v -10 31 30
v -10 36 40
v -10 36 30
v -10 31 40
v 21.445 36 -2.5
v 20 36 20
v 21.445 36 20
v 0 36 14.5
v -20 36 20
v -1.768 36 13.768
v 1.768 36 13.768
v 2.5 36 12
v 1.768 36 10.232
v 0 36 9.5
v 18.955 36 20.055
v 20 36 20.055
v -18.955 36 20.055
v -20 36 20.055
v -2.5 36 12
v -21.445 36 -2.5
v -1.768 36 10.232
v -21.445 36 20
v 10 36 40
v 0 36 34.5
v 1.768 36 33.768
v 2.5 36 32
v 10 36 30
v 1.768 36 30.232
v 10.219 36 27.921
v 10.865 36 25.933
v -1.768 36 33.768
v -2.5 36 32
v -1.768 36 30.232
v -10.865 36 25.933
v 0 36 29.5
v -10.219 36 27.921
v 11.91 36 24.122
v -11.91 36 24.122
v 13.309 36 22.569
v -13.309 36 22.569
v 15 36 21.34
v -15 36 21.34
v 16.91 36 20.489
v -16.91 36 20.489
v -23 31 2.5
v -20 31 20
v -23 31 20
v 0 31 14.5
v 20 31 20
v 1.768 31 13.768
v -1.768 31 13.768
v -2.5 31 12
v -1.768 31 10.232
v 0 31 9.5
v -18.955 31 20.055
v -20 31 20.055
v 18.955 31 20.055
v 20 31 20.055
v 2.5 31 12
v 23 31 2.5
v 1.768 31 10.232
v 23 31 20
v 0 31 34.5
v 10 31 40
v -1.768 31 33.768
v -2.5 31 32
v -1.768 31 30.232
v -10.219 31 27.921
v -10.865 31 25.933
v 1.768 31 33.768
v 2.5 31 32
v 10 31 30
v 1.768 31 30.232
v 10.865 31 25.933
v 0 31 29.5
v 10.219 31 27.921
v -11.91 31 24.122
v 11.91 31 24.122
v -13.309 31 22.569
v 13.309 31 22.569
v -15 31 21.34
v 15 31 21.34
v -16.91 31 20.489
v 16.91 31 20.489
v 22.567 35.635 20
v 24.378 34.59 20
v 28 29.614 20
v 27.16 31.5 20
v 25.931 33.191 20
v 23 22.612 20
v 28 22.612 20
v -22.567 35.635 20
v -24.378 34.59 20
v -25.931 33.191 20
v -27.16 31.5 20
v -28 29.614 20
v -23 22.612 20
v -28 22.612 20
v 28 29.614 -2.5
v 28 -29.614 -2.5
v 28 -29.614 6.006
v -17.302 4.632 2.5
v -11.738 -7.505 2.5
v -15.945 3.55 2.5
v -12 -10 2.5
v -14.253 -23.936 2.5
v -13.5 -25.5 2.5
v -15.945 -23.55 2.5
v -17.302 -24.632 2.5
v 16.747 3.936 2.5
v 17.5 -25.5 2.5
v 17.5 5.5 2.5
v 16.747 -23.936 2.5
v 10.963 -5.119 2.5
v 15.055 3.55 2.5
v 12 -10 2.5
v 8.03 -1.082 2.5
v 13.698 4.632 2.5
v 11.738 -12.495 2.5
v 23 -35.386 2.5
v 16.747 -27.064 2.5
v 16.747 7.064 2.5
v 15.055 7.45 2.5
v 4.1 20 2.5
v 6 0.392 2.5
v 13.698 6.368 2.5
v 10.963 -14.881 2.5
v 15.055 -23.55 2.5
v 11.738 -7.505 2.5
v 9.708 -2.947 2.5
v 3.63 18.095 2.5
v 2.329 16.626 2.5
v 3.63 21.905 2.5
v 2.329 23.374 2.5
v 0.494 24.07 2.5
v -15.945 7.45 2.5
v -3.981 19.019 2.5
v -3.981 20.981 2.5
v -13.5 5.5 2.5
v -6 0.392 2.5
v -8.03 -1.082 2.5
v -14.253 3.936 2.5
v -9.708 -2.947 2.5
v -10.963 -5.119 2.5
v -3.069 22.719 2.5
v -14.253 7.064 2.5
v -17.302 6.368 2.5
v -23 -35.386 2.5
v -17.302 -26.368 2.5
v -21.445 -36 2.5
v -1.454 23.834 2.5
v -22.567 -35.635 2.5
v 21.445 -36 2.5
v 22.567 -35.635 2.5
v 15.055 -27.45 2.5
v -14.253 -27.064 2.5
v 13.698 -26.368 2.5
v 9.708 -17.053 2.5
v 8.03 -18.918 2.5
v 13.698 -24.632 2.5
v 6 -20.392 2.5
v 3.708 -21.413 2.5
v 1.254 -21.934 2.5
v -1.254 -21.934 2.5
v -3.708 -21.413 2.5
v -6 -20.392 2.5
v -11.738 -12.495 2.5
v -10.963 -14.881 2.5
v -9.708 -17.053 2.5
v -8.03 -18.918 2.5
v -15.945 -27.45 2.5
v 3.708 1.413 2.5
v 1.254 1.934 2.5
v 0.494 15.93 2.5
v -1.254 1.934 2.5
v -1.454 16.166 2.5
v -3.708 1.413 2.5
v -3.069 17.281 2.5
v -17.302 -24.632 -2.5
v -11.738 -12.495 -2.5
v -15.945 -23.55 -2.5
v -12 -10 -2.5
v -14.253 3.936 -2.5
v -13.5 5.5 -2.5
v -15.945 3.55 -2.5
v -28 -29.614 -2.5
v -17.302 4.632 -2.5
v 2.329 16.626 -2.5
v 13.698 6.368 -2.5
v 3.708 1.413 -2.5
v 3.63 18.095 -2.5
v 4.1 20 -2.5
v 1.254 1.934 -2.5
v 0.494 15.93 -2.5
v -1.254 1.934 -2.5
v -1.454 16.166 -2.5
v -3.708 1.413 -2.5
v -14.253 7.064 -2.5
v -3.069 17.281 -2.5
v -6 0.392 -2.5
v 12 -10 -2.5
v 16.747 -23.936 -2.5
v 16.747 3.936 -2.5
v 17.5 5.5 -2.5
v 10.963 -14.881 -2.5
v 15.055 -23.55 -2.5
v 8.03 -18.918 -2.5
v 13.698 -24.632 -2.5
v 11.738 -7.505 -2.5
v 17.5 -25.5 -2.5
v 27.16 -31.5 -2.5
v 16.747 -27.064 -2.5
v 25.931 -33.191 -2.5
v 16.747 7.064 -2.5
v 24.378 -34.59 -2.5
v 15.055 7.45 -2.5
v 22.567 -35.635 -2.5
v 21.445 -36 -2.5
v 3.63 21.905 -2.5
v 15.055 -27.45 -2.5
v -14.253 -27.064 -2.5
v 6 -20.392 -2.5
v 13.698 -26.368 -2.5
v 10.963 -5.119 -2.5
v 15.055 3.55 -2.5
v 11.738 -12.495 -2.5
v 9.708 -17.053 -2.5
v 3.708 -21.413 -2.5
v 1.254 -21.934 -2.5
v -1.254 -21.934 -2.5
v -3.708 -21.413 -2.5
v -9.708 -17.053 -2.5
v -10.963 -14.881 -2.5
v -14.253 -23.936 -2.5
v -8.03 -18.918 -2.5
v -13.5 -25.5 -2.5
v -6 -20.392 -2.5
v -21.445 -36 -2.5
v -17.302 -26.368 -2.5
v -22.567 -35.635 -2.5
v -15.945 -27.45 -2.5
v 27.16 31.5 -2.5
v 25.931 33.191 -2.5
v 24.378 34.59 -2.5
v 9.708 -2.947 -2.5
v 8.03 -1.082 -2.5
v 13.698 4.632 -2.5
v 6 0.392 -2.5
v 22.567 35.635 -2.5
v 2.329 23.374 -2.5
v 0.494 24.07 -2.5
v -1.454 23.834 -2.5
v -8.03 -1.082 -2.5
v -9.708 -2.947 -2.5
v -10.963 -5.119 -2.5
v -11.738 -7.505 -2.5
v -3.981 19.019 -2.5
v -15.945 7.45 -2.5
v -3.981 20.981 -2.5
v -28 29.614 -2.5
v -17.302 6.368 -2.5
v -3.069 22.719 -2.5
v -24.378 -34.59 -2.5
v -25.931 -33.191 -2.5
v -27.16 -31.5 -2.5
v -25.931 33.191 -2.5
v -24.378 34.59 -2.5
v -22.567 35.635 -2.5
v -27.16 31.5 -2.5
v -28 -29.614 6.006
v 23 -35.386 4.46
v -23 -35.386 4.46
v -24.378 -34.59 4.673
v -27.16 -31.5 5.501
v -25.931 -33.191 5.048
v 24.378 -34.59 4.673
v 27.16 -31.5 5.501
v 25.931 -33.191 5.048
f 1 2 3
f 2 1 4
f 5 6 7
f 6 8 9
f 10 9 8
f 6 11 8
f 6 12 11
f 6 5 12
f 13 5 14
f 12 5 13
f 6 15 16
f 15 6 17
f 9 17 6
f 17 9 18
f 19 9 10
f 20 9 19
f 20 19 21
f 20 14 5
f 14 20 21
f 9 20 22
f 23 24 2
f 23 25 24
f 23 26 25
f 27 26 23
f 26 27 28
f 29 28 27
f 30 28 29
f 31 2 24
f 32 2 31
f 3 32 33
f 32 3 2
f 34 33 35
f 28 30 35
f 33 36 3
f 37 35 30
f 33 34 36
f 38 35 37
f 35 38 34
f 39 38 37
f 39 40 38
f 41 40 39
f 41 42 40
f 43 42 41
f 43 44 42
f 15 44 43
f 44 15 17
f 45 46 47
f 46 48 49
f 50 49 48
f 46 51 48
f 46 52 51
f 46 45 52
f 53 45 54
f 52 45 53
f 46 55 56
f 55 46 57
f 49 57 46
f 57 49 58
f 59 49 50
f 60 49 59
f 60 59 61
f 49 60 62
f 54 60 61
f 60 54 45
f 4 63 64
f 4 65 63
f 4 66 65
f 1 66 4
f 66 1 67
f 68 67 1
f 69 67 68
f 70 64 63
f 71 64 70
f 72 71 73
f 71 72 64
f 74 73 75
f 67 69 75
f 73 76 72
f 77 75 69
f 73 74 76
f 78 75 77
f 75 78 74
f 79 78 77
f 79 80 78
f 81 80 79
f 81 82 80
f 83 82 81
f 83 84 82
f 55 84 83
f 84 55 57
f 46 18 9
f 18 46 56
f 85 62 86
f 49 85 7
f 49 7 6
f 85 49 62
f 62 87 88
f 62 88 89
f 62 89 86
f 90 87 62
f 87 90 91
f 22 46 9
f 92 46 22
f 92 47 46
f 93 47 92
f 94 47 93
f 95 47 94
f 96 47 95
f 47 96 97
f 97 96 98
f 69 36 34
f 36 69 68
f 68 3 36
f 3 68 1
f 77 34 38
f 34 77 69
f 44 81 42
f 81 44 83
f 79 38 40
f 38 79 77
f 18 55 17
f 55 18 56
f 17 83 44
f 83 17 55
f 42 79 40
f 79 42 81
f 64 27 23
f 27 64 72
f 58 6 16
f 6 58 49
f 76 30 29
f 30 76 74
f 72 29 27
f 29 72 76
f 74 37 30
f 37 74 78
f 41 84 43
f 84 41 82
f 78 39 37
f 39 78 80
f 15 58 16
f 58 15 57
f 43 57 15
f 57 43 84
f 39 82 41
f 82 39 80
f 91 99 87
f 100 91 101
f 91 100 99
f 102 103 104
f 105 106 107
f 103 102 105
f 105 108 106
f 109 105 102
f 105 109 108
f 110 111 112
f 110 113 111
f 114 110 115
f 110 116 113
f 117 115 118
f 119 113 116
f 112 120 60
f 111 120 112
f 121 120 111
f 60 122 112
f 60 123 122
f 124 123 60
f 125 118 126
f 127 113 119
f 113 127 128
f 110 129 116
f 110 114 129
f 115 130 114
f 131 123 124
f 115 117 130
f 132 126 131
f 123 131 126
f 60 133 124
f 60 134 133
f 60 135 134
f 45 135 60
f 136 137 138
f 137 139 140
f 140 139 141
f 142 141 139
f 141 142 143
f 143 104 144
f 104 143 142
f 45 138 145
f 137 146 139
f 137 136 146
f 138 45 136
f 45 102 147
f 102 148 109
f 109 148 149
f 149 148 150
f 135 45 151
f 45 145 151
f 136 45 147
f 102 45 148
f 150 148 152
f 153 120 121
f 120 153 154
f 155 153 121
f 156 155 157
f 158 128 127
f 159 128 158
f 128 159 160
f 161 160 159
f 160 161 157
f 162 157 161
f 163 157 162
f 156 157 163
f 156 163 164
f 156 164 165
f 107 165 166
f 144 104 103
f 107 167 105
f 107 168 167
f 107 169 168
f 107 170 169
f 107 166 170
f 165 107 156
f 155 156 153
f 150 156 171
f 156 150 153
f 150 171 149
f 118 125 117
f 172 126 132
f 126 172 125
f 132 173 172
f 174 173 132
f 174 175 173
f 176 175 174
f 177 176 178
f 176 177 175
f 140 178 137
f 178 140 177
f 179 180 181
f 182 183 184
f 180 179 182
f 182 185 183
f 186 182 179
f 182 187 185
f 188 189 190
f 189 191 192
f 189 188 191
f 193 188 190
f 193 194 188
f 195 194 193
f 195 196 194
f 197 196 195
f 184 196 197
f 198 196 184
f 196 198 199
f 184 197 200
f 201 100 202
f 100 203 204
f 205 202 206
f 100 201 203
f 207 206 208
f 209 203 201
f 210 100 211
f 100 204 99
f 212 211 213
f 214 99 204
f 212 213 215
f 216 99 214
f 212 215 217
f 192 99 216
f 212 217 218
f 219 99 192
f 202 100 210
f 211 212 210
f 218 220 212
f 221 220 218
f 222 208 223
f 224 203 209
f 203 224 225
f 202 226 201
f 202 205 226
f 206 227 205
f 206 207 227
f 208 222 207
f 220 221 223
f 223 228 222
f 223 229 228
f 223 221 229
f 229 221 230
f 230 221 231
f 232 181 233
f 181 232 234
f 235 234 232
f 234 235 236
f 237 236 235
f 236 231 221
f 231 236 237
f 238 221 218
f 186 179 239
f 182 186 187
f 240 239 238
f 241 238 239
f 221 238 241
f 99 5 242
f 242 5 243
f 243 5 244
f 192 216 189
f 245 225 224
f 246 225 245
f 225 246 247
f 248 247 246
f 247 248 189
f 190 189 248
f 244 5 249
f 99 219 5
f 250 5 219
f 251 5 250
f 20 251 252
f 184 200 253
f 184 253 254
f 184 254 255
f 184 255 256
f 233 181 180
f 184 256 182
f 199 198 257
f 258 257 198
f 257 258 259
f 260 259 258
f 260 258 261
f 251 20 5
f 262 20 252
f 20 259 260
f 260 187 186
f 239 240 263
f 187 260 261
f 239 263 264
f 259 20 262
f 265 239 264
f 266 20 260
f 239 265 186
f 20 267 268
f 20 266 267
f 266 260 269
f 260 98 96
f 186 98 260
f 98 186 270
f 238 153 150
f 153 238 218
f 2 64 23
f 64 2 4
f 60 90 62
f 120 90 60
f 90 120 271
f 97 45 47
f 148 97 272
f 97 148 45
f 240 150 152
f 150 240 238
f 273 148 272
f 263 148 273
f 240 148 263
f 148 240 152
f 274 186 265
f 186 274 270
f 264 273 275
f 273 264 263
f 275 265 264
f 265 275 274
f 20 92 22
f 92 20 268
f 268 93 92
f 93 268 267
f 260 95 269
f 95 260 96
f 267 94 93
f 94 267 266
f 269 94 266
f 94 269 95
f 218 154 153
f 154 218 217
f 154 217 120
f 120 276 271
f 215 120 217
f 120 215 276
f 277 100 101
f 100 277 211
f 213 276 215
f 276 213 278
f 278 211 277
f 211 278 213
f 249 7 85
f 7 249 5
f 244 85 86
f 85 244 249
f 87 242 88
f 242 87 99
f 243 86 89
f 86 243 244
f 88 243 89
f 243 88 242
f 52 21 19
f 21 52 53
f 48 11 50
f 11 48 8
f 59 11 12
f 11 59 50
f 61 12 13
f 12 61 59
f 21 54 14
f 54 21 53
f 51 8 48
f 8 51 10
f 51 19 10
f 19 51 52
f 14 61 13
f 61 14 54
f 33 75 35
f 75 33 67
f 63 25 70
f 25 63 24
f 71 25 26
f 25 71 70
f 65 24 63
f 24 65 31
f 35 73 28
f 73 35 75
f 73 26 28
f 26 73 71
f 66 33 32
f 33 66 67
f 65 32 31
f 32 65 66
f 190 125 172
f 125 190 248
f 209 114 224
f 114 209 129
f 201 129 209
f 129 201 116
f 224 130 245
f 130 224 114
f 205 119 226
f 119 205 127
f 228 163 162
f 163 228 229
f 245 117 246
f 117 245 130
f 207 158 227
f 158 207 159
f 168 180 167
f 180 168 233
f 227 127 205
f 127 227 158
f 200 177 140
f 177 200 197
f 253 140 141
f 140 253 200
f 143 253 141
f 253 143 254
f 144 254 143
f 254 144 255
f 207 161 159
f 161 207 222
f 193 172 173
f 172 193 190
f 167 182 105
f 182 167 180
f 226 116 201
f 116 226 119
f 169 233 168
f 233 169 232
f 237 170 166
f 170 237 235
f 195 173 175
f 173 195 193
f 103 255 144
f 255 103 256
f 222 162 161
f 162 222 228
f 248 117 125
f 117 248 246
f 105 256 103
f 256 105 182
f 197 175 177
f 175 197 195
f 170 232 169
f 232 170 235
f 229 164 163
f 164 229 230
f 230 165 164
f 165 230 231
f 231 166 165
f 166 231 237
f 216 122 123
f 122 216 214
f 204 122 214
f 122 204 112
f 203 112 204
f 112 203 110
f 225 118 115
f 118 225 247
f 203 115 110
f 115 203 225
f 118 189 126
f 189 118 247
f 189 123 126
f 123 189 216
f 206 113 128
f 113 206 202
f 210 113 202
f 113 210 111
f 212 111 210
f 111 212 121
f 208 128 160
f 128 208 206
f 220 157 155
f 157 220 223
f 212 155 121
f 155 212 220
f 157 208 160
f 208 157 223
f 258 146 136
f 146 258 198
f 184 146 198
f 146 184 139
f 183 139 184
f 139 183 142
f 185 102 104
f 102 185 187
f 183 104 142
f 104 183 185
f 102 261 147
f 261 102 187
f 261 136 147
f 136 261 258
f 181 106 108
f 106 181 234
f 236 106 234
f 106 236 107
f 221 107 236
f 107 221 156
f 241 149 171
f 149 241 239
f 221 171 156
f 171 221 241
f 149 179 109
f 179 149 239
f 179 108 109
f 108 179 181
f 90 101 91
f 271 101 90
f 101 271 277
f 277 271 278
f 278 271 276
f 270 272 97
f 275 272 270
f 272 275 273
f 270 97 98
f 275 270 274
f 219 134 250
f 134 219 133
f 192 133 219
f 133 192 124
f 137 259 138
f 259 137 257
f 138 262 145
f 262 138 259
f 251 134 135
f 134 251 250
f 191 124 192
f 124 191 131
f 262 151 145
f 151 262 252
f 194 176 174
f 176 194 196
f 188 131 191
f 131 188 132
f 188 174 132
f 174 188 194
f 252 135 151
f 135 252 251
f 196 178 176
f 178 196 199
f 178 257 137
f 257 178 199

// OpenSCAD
// file: Rook_Config.scad
// Rook 3D Printer Configuration
// Created By Jeffrey Olijar 
// Jolijar@gmail.com
// Revision 1.00


// 608 skate bearing
Bearing_OD = 22.5; 
Bearing_ID = 8;
Bearing_H = 7;

//M5 Screw Hole Diameter
M5 = 5;
//M4 Screw Hole Diameter
M4 = 4;

//M8 Rod Diameter (configure for a tight fit)
M8 = 8.2;
//M8 Nut Diameter
N8 = 15.5;

//LM8UU Bearing
LBD = 15.5; // Diameter
LBH = 25; // Height
LBI = 8;  // Inner Diameter

//Makergear Groovemount
GVO = 16.5; // Outside Diameter
GVI = 12.5;  // Inside Groove Diameter
// main file
// Rook 3D Printer 
// Z Motor Holder
// Created By Jeffrey Olijar 
// Jolijar@gmail.com
// Revision 1.00
// 2 x requred 

include <Rook_Config.scad>

module Rook_Z_Motor(){



//Fillets
	difference(){
		union(){
			rotate(a=[-90,0,0])translate(v=[-20,-30,31]){	
	difference(){
		cube(size = [10,10,5]);
		cylinder(r=10, h=25, center=true);
		}}
		rotate(a=[-90,0,180])translate(v=[-20,-30,-36]){	
	difference(){
			cube(size = [10,10,5]);
			cylinder(r=10, h=25, center=true);
			}}






			cube(size = [56,72,5], center = true);
			translate(v=[0,33.5,20]){			
				cube(size = [20,5,40], center = true);
				}
			translate(v=[0,33.5,10]){			
				cube(size = [56,5,20], center = true);
				}
			translate(v=[25.5,0,10]){			
				cube(size = [5,72,20], center = true);
				}
			translate(v=[-25.5,0,10]){			
				cube(size = [5,72,20], center = true);
				}
			}


		union(){


difference(){
		union(){
			rotate(a=[0,180,90])translate(v=[26.5,18.5,-10]){	
	difference(){
		cube(size = [10,10,25]);
		cylinder(r=10, h=25, center=true);
		}}}}
difference(){
		union(){
			rotate(a=[0,0,90])translate(v=[26.5,18.5,-5]){	
	difference(){
		cube(size = [10,10,25]);
		cylinder(r=10, h=55, center=true);
		}}}}

rotate(a=[0,180,0])translate(v=[0,0,0]){
difference(){
		union(){
			rotate(a=[0,180,90])translate(v=[26.5,18.5,-10]){	
	difference(){
		cube(size = [10,10,35]);

		cylinder(r=10, h=55, center=true);
		}}}}

difference(){
		union(){
			rotate(a=[0,0,90])translate(v=[26.5,18.5,-25]){	
	difference(){
		cube(size = [10,10,55]);
		cylinder(r=10, h=55, center=true);
		}}}}}






translate(v=[0,-18,35])rotate(a=[15,0,0]){
	cube(size = [58,87,50], center = true);
}
			translate(v=[0,40,12])rotate(a=[90,0,0]){
				cylinder(h=20,r= M5/2);
				translate(v=[0,20,0]){
					cylinder(h=20,r= M5/2);
				}
			}
			translate(v=[0,20,-10]){
				cylinder(h=20,r=M8/2);
			}
			translate(v=[0,-10,-10]){
				cylinder(h=20,r=12);
				translate(v=[15.5,15.5,0]){
					cylinder(h=20,r=	M4/2);
				}
				translate(v=[15.5,-15.5,0]){
					cylinder(h=20,r=M4/2);
				}
				translate(v=[-15.5,15.5,0]){
					cylinder(h=20,r=M4/2);
				}
				translate(v=[-15.5,-15.5,0]){
					cylinder(h=20,r=M4/2);
				}
			}
		}
	}	
}
Rook_Z_Motor();
